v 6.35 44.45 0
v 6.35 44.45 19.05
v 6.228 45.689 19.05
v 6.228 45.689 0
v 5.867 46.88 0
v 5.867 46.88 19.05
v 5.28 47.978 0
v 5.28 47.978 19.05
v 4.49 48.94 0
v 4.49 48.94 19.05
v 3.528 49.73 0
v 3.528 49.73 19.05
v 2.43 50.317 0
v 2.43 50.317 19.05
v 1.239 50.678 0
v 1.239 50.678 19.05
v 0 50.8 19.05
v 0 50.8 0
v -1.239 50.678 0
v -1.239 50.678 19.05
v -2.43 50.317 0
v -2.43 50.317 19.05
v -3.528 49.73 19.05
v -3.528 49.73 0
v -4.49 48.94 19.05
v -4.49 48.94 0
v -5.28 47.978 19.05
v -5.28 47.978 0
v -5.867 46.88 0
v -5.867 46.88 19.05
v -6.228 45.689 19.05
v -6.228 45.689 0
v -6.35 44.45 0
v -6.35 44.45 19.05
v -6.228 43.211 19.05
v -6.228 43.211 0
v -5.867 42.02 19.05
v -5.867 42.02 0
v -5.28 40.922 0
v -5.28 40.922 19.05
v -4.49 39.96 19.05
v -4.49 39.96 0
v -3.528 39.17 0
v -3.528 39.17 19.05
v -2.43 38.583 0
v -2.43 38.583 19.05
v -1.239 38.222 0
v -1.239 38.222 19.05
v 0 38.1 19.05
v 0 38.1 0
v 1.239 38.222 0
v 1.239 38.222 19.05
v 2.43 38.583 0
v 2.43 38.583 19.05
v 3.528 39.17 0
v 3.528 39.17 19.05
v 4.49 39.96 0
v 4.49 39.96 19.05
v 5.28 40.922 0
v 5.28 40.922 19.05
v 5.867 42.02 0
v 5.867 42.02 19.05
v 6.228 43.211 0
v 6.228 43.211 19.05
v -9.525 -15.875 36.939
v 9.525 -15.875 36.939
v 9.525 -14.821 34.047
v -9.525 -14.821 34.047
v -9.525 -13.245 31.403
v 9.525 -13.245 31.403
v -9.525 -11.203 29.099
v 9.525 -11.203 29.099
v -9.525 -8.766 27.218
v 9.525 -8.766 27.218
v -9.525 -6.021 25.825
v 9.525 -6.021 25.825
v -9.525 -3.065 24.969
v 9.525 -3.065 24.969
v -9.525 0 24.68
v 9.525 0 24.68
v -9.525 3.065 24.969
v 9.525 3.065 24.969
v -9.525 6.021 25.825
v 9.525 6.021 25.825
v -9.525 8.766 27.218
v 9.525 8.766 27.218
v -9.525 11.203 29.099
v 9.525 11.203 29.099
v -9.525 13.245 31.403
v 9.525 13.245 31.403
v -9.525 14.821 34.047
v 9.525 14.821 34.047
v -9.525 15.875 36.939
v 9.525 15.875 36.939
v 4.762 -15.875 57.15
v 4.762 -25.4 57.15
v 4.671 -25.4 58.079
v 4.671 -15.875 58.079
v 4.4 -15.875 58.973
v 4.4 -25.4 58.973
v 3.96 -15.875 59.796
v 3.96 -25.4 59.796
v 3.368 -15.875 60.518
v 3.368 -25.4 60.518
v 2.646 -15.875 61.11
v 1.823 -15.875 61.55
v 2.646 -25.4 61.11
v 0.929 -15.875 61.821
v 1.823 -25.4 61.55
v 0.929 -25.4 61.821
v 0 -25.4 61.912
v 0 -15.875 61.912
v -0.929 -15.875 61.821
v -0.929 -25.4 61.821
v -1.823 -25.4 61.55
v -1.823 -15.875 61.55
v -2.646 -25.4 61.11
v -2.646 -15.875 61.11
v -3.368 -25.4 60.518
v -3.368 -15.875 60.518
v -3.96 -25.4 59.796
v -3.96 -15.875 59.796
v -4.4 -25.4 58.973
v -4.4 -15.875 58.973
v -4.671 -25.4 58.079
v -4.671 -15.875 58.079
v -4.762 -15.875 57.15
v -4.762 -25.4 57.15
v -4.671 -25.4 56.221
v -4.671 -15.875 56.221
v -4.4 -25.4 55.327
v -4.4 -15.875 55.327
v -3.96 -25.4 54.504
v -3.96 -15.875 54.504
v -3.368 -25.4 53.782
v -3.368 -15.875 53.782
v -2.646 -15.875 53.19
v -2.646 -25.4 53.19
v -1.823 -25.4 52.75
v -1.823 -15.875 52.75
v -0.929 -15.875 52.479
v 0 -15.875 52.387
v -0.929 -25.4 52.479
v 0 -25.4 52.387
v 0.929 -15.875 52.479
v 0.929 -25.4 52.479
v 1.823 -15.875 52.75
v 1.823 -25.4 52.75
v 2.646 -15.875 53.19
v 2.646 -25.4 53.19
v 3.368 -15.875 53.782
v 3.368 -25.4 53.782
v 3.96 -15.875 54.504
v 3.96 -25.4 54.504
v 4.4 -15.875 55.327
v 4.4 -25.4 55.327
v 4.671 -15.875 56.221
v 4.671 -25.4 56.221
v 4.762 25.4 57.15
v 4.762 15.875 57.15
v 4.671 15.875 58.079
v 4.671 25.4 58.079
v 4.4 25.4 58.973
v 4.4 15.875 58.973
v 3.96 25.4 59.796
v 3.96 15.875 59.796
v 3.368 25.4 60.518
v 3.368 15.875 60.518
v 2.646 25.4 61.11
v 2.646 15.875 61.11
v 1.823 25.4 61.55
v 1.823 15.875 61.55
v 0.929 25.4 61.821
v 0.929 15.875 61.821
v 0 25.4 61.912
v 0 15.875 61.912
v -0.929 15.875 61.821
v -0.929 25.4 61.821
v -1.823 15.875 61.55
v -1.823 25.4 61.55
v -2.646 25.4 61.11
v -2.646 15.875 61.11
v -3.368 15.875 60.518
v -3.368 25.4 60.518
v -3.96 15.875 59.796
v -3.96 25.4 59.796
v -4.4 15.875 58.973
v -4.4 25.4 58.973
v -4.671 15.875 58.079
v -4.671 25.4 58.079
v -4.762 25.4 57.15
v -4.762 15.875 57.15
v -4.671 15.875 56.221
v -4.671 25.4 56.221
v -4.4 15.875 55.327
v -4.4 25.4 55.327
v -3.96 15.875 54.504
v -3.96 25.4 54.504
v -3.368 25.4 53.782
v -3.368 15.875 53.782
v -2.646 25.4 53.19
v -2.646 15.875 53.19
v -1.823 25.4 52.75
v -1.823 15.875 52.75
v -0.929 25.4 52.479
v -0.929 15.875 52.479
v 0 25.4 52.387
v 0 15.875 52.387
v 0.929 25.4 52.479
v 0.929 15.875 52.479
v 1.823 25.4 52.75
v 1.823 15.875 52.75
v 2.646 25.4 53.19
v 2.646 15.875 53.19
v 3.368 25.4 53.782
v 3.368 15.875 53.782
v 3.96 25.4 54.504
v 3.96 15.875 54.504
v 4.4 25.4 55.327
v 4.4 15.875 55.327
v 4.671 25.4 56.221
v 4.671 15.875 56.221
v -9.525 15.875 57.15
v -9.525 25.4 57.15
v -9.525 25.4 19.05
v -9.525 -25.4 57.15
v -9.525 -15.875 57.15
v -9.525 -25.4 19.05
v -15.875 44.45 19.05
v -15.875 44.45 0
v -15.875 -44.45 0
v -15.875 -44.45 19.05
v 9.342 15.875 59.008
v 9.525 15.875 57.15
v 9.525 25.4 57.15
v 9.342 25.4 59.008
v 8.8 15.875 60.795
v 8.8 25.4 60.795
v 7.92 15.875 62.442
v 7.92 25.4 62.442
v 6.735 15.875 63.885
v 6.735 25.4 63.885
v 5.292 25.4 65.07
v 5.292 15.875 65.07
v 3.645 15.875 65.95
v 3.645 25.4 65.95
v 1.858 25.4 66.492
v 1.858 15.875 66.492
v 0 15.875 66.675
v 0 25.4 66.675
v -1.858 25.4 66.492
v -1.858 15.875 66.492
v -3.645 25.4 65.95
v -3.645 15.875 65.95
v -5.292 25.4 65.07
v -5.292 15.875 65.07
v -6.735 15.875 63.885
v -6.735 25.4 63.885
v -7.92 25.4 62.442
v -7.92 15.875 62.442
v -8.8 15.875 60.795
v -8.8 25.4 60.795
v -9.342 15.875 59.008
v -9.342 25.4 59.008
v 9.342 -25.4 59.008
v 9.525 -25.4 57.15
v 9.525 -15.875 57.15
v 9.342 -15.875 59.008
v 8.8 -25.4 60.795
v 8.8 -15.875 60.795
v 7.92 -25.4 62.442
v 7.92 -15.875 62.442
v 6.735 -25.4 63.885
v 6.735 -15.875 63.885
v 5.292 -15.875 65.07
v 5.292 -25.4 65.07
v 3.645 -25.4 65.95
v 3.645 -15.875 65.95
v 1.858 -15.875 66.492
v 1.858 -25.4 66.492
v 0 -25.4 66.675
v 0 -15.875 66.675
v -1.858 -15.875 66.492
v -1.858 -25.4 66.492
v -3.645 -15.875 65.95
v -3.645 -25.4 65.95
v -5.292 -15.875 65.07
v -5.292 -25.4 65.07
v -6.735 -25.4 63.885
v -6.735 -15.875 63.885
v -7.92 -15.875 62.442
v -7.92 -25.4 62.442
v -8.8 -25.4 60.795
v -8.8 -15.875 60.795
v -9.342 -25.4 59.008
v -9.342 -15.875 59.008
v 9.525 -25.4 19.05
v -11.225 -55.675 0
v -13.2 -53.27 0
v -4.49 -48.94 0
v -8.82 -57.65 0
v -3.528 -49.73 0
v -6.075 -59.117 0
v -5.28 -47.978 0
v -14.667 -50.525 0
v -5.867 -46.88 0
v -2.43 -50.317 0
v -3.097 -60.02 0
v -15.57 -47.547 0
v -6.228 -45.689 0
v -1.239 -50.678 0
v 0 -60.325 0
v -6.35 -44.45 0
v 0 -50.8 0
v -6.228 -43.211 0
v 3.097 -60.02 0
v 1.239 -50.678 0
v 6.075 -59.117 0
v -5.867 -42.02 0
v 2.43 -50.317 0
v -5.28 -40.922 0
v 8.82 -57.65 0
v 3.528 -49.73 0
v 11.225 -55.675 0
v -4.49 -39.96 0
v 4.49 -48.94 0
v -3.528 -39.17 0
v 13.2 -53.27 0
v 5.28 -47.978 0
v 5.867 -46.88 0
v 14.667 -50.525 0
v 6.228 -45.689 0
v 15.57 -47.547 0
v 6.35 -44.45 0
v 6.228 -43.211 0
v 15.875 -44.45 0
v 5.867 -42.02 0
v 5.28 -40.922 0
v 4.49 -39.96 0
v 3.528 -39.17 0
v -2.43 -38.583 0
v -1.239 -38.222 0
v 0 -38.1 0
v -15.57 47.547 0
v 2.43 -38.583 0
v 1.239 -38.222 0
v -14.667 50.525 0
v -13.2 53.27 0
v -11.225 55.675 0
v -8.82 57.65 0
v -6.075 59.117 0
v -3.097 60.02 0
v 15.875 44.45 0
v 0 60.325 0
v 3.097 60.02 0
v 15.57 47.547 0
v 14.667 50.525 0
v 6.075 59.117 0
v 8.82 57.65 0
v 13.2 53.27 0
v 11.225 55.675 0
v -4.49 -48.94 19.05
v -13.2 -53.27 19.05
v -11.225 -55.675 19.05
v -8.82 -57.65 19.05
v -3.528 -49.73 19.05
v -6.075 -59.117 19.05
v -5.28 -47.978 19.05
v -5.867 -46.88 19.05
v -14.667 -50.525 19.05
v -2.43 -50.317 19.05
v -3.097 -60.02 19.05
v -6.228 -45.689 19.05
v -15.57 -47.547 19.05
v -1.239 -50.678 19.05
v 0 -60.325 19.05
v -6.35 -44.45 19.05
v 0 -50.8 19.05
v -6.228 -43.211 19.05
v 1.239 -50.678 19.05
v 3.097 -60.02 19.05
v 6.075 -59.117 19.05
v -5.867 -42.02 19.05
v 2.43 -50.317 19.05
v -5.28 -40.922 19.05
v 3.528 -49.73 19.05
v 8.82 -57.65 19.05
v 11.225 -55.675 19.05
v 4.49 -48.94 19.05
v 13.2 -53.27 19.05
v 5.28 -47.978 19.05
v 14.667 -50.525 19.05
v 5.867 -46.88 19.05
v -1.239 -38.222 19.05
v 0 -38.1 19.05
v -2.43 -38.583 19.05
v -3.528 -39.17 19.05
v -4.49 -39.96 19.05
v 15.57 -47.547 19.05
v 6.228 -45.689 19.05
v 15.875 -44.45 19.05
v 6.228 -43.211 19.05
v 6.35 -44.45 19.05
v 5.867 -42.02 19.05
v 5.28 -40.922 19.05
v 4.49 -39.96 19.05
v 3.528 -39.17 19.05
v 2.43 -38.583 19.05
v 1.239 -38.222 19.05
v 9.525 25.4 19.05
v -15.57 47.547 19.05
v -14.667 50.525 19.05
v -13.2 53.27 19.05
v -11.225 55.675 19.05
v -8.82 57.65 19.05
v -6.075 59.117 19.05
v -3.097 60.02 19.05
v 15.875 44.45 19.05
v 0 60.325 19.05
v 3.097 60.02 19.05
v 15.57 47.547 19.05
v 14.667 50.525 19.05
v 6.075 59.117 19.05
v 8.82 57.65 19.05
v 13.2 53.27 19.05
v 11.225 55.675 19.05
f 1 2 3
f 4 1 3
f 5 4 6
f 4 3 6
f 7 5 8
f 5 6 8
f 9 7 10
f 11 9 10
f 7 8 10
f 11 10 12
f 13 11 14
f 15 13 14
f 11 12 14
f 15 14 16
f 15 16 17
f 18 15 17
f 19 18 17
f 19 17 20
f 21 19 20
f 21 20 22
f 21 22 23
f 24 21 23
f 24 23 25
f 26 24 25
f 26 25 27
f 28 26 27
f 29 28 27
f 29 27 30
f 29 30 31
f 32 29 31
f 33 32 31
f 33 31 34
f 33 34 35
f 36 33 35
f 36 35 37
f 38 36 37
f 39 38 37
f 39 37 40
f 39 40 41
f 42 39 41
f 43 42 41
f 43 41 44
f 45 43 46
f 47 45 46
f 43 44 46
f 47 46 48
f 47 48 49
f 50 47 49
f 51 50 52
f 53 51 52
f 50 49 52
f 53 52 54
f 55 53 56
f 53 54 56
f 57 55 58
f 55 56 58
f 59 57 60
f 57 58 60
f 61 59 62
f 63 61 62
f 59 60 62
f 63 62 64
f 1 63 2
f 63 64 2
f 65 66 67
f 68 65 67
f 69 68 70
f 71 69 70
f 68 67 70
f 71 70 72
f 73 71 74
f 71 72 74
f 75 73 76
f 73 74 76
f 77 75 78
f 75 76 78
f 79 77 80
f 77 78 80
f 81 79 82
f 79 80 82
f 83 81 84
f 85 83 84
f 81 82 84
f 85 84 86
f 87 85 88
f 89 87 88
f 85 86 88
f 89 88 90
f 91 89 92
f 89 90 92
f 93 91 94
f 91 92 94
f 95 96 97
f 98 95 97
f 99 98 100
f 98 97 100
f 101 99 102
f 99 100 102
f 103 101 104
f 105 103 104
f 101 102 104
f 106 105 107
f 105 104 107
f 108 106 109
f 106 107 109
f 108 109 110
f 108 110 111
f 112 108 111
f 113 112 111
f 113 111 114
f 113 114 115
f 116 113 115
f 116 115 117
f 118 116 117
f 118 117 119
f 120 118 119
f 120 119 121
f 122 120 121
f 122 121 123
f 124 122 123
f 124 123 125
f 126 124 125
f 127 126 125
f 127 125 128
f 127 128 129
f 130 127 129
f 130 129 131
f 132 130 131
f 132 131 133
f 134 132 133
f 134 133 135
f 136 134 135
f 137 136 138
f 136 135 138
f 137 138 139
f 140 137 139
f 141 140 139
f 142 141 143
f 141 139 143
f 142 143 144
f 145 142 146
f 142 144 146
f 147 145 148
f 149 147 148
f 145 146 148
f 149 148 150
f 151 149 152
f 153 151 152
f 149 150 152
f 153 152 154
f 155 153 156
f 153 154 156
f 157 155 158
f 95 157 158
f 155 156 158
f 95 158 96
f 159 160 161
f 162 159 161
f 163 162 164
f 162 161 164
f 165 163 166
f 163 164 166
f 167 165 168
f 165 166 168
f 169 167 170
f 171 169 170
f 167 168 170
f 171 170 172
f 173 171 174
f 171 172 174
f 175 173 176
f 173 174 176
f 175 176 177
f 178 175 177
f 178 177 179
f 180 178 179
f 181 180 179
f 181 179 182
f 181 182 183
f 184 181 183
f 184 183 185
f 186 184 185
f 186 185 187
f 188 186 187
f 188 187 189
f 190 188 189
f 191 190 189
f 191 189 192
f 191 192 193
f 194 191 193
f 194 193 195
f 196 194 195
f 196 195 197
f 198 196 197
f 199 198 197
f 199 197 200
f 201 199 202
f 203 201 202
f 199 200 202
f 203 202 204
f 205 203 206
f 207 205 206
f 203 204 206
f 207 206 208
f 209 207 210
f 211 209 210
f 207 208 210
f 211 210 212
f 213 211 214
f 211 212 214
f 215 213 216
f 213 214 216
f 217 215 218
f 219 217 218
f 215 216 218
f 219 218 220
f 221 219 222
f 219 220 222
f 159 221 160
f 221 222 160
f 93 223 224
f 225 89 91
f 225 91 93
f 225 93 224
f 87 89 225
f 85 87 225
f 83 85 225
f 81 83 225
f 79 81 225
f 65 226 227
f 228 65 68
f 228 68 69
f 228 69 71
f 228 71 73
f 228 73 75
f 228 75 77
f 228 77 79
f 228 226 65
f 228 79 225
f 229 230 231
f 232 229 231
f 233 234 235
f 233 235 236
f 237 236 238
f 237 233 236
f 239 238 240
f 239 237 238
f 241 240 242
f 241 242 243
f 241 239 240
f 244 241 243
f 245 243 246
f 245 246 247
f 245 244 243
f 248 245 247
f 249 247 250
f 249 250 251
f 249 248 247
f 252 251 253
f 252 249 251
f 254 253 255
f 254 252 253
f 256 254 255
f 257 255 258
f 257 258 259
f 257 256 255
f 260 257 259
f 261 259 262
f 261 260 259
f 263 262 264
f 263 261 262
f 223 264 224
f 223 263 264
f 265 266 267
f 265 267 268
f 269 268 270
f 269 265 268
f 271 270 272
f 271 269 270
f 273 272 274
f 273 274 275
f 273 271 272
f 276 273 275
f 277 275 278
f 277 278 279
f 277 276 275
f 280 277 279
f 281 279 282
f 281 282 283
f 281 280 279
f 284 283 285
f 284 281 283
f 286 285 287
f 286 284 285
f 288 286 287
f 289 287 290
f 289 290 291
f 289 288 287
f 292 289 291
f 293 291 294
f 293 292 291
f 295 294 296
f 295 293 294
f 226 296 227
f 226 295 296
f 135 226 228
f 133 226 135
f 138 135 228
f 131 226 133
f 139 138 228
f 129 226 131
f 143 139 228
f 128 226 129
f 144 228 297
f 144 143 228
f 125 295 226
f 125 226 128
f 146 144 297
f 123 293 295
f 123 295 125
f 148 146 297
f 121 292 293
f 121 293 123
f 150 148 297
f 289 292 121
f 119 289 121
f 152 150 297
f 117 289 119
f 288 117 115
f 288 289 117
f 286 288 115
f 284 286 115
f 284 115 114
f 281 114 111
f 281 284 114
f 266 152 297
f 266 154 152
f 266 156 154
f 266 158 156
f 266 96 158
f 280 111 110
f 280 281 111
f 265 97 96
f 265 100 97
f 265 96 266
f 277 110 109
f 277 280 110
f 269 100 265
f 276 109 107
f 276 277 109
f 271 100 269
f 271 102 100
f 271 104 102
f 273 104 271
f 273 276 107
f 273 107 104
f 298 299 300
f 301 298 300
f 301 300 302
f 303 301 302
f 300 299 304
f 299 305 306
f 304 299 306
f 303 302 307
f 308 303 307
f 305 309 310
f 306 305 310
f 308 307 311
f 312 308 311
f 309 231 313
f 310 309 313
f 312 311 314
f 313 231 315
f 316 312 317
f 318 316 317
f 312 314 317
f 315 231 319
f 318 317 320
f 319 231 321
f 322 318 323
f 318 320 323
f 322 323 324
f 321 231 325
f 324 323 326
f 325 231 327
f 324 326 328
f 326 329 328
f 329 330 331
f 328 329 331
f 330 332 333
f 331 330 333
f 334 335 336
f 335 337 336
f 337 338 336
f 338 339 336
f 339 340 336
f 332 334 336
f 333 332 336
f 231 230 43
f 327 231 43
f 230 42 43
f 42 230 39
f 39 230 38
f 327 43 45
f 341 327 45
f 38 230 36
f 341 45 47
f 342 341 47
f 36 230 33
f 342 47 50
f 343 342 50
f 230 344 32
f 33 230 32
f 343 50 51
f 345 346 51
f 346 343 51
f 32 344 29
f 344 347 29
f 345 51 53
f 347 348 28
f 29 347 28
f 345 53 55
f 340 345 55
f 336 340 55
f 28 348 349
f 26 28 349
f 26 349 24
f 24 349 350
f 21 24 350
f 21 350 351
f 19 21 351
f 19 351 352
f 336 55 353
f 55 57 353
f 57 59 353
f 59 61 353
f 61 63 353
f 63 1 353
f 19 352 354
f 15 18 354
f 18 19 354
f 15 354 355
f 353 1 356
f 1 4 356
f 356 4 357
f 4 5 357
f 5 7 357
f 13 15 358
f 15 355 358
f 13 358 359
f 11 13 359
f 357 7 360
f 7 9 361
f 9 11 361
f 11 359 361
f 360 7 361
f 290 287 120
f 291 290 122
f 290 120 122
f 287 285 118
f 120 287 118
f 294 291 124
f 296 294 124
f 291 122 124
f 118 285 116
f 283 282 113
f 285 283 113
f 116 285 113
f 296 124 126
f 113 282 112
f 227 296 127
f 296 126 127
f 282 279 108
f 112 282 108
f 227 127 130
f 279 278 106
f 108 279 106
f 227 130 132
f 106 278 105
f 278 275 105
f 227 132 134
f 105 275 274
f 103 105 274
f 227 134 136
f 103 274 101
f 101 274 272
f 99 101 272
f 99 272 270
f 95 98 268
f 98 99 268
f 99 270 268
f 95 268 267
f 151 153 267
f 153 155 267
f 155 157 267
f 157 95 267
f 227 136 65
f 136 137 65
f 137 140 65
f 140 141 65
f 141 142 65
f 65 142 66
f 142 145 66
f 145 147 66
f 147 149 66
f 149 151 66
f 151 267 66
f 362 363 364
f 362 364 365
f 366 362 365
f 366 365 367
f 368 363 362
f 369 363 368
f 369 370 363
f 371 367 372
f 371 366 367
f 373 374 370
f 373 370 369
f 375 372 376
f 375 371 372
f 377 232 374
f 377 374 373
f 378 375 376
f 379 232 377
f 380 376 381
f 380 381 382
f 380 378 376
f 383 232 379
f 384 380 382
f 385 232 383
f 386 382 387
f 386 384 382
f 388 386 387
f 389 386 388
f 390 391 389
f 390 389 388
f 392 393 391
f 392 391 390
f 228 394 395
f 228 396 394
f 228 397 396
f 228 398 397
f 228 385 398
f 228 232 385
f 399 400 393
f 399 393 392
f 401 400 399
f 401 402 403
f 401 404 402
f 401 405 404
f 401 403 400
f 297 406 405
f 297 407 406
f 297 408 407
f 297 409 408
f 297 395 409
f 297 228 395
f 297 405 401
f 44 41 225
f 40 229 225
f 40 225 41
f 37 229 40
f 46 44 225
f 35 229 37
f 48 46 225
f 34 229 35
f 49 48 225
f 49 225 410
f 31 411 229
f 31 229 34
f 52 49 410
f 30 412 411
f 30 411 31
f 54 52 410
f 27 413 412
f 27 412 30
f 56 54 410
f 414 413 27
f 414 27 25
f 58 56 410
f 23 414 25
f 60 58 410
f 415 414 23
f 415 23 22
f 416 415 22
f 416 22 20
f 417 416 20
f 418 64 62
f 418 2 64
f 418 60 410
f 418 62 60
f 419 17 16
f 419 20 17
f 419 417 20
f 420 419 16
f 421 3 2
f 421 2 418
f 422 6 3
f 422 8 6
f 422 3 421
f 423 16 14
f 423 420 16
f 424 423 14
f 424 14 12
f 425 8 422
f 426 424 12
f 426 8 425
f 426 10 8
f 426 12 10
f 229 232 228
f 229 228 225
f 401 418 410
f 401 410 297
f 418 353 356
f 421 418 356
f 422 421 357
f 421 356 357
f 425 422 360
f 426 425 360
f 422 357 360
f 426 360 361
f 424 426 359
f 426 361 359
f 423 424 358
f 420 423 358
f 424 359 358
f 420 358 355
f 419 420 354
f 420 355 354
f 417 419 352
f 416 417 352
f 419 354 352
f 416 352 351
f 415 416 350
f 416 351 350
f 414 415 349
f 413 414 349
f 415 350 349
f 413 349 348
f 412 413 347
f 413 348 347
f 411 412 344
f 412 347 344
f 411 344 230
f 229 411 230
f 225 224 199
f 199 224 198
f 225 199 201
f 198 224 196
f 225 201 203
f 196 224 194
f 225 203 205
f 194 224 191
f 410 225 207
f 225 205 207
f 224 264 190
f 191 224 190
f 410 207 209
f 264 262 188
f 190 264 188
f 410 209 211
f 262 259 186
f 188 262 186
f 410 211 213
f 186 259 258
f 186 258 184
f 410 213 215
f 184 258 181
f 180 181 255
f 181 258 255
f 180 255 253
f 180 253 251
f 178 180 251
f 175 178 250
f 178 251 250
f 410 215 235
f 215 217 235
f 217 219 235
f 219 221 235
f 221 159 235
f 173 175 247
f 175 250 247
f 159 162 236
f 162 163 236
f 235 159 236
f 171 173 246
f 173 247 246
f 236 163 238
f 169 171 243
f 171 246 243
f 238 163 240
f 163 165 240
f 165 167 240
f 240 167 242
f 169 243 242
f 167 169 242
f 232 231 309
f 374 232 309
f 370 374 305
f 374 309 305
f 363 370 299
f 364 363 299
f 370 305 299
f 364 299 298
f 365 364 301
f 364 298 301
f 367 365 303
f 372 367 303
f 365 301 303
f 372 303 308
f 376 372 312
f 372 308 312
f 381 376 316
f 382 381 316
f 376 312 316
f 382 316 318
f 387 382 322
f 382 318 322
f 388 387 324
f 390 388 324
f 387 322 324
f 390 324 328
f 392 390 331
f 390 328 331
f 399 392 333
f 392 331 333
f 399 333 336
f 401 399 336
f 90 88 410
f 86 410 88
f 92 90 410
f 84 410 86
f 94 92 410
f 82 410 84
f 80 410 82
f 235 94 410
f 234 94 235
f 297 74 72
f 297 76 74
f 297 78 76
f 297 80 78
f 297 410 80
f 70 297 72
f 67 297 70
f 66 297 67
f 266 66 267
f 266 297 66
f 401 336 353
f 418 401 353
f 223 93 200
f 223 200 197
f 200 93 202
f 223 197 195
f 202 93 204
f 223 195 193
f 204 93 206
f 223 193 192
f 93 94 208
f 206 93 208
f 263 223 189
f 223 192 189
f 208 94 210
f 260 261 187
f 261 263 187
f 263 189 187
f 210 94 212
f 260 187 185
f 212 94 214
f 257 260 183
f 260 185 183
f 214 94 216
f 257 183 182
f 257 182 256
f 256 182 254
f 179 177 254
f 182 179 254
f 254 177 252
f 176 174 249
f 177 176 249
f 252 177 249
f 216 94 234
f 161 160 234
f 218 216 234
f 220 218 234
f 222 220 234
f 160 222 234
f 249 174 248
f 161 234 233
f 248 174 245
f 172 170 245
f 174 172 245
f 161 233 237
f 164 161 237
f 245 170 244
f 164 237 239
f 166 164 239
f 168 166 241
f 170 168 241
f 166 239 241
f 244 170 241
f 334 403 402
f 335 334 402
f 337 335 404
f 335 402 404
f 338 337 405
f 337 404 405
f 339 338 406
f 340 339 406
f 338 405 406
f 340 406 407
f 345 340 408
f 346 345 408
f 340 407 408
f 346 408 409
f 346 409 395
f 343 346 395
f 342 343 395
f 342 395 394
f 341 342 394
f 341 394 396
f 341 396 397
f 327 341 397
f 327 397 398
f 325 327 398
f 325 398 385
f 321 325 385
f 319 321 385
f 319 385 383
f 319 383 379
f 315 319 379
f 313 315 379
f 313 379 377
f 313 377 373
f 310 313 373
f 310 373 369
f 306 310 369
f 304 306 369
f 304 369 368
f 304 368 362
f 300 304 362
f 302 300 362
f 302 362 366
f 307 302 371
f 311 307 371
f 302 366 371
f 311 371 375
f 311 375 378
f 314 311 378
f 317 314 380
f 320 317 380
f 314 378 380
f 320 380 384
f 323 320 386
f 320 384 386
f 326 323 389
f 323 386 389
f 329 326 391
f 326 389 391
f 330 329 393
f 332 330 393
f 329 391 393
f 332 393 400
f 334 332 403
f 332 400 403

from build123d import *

# Parameters (mm, degrees)
F1_DEPTH = 19.05
F2_R     = 6.35
F3_DEPTH = 25.4
F5_DEPTH = 25.4
F6_R     = 4.7625
F7_DEPTH = 50.8
F9_DEPTH = 25.4


with BuildPart() as f1:
    # F0 (on Top) → F1 (new body)
    with BuildSketch(Plane.XY):
        with BuildLine():
            ThreePointArc((-15.875, 44.45), (0, 28.575), (15.875, 44.45))
            Line((15.875, 44.45), (-15.875, 44.45))
        make_face()
        with BuildLine():
            Line((-15.875, 44.45), (15.875, 44.45))
            ThreePointArc((15.875, 44.45), (0, 60.325), (-15.875, 44.45))
        make_face()
        with BuildLine():
            Line((15.875, -44.45), (15.875, 44.45))
            ThreePointArc((15.875, 44.45), (0, 28.575), (-15.875, 44.45))
            Line((-15.875, 44.45), (-15.875, -44.45))
            ThreePointArc((-15.875, -44.45), (0, -28.575), (15.875, -44.45))
        make_face()
        with BuildLine():
            ThreePointArc((-15.875, -44.45), (0, -60.325), (15.875, -44.45))
            Line((15.875, -44.45), (-15.875, -44.45))
        make_face()
        with BuildLine():
            Line((-15.875, -44.45), (15.875, -44.45))
            ThreePointArc((15.875, -44.45), (0, -28.575), (-15.875, -44.45))
        make_face()
    extrude(amount=F1_DEPTH)

    # F2 (on face) → F3 (cut)
    with BuildSketch(Plane.XY.offset(19.05)):
        with Locations((0, -44.45)):
            Circle(F2_R)
        with Locations((0, 44.45)):
            Circle(F2_R)
    extrude(amount=-F3_DEPTH, mode=Mode.SUBTRACT)

    # F4 (on Front) → F5 (join, symmetric)
    with BuildSketch(Plane.XZ):
        with BuildLine():
            Line((-9.525, 57.15), (-9.525, 19.05))
            Line((-9.525, 19.05), (9.525, 19.05))
            Line((9.525, 19.05), (9.525, 57.15))
            ThreePointArc((9.525, 57.15), (0, 47.625), (-9.525, 57.15))
        make_face()
        with BuildLine():
            ThreePointArc((9.525, 57.15), (0, 66.675), (-9.525, 57.15))
            Line((-9.525, 57.15), (9.525, 57.15))
        make_face()
        with BuildLine():
            Line((9.525, 57.15), (-9.525, 57.15))
            ThreePointArc((-9.525, 57.15), (0, 47.625), (9.525, 57.15))
        make_face()
    extrude(amount=F5_DEPTH, both=True)

    # F6 (on face) → F7 (cut, through all)
    with BuildSketch(Plane.XZ.offset(25.4)):
        with Locations((0, 57.15)):
            Circle(F6_R)
    extrude(amount=-F7_DEPTH, mode=Mode.SUBTRACT)

    # F8 (on face) → F9 (cut)
    with BuildSketch(Plane.YZ.offset(9.525)):
        with BuildLine():
            Line((15.875, 71.8479231), (0, 71.8479231))
            Line((0, 71.8479231), (-15.875, 71.8479231))
            Line((-15.875, 71.8479231), (-15.875, 45.2380125161))
            ThreePointArc((-15.875, 45.2380125161), (0, 57.496732945), (15.875, 45.2380125161))
            Line((15.875, 45.2380125161), (15.875, 71.8479231))
        make_face()
        with BuildLine():
            ThreePointArc((15.875, 45.2380125161), (0, 57.496732945), (-15.875, 45.2380125161))
            Line((-15.875, 45.2380125161), (-15.875, 36.9386635721))
            Line((-15.875, 36.9386635721), (15.875, 36.9386635721))
            Line((15.875, 36.9386635721), (15.875, 45.2380125161))
        make_face()
        with BuildLine():
            Line((15.875, 36.9386635721), (-15.875, 36.9386635721))
            ThreePointArc((-15.875, 36.9386635721), (0, 24.6799431432), (15.875, 36.9386635721))
        make_face()
    extrude(amount=-F9_DEPTH, mode=Mode.SUBTRACT)


solid = f1.part
